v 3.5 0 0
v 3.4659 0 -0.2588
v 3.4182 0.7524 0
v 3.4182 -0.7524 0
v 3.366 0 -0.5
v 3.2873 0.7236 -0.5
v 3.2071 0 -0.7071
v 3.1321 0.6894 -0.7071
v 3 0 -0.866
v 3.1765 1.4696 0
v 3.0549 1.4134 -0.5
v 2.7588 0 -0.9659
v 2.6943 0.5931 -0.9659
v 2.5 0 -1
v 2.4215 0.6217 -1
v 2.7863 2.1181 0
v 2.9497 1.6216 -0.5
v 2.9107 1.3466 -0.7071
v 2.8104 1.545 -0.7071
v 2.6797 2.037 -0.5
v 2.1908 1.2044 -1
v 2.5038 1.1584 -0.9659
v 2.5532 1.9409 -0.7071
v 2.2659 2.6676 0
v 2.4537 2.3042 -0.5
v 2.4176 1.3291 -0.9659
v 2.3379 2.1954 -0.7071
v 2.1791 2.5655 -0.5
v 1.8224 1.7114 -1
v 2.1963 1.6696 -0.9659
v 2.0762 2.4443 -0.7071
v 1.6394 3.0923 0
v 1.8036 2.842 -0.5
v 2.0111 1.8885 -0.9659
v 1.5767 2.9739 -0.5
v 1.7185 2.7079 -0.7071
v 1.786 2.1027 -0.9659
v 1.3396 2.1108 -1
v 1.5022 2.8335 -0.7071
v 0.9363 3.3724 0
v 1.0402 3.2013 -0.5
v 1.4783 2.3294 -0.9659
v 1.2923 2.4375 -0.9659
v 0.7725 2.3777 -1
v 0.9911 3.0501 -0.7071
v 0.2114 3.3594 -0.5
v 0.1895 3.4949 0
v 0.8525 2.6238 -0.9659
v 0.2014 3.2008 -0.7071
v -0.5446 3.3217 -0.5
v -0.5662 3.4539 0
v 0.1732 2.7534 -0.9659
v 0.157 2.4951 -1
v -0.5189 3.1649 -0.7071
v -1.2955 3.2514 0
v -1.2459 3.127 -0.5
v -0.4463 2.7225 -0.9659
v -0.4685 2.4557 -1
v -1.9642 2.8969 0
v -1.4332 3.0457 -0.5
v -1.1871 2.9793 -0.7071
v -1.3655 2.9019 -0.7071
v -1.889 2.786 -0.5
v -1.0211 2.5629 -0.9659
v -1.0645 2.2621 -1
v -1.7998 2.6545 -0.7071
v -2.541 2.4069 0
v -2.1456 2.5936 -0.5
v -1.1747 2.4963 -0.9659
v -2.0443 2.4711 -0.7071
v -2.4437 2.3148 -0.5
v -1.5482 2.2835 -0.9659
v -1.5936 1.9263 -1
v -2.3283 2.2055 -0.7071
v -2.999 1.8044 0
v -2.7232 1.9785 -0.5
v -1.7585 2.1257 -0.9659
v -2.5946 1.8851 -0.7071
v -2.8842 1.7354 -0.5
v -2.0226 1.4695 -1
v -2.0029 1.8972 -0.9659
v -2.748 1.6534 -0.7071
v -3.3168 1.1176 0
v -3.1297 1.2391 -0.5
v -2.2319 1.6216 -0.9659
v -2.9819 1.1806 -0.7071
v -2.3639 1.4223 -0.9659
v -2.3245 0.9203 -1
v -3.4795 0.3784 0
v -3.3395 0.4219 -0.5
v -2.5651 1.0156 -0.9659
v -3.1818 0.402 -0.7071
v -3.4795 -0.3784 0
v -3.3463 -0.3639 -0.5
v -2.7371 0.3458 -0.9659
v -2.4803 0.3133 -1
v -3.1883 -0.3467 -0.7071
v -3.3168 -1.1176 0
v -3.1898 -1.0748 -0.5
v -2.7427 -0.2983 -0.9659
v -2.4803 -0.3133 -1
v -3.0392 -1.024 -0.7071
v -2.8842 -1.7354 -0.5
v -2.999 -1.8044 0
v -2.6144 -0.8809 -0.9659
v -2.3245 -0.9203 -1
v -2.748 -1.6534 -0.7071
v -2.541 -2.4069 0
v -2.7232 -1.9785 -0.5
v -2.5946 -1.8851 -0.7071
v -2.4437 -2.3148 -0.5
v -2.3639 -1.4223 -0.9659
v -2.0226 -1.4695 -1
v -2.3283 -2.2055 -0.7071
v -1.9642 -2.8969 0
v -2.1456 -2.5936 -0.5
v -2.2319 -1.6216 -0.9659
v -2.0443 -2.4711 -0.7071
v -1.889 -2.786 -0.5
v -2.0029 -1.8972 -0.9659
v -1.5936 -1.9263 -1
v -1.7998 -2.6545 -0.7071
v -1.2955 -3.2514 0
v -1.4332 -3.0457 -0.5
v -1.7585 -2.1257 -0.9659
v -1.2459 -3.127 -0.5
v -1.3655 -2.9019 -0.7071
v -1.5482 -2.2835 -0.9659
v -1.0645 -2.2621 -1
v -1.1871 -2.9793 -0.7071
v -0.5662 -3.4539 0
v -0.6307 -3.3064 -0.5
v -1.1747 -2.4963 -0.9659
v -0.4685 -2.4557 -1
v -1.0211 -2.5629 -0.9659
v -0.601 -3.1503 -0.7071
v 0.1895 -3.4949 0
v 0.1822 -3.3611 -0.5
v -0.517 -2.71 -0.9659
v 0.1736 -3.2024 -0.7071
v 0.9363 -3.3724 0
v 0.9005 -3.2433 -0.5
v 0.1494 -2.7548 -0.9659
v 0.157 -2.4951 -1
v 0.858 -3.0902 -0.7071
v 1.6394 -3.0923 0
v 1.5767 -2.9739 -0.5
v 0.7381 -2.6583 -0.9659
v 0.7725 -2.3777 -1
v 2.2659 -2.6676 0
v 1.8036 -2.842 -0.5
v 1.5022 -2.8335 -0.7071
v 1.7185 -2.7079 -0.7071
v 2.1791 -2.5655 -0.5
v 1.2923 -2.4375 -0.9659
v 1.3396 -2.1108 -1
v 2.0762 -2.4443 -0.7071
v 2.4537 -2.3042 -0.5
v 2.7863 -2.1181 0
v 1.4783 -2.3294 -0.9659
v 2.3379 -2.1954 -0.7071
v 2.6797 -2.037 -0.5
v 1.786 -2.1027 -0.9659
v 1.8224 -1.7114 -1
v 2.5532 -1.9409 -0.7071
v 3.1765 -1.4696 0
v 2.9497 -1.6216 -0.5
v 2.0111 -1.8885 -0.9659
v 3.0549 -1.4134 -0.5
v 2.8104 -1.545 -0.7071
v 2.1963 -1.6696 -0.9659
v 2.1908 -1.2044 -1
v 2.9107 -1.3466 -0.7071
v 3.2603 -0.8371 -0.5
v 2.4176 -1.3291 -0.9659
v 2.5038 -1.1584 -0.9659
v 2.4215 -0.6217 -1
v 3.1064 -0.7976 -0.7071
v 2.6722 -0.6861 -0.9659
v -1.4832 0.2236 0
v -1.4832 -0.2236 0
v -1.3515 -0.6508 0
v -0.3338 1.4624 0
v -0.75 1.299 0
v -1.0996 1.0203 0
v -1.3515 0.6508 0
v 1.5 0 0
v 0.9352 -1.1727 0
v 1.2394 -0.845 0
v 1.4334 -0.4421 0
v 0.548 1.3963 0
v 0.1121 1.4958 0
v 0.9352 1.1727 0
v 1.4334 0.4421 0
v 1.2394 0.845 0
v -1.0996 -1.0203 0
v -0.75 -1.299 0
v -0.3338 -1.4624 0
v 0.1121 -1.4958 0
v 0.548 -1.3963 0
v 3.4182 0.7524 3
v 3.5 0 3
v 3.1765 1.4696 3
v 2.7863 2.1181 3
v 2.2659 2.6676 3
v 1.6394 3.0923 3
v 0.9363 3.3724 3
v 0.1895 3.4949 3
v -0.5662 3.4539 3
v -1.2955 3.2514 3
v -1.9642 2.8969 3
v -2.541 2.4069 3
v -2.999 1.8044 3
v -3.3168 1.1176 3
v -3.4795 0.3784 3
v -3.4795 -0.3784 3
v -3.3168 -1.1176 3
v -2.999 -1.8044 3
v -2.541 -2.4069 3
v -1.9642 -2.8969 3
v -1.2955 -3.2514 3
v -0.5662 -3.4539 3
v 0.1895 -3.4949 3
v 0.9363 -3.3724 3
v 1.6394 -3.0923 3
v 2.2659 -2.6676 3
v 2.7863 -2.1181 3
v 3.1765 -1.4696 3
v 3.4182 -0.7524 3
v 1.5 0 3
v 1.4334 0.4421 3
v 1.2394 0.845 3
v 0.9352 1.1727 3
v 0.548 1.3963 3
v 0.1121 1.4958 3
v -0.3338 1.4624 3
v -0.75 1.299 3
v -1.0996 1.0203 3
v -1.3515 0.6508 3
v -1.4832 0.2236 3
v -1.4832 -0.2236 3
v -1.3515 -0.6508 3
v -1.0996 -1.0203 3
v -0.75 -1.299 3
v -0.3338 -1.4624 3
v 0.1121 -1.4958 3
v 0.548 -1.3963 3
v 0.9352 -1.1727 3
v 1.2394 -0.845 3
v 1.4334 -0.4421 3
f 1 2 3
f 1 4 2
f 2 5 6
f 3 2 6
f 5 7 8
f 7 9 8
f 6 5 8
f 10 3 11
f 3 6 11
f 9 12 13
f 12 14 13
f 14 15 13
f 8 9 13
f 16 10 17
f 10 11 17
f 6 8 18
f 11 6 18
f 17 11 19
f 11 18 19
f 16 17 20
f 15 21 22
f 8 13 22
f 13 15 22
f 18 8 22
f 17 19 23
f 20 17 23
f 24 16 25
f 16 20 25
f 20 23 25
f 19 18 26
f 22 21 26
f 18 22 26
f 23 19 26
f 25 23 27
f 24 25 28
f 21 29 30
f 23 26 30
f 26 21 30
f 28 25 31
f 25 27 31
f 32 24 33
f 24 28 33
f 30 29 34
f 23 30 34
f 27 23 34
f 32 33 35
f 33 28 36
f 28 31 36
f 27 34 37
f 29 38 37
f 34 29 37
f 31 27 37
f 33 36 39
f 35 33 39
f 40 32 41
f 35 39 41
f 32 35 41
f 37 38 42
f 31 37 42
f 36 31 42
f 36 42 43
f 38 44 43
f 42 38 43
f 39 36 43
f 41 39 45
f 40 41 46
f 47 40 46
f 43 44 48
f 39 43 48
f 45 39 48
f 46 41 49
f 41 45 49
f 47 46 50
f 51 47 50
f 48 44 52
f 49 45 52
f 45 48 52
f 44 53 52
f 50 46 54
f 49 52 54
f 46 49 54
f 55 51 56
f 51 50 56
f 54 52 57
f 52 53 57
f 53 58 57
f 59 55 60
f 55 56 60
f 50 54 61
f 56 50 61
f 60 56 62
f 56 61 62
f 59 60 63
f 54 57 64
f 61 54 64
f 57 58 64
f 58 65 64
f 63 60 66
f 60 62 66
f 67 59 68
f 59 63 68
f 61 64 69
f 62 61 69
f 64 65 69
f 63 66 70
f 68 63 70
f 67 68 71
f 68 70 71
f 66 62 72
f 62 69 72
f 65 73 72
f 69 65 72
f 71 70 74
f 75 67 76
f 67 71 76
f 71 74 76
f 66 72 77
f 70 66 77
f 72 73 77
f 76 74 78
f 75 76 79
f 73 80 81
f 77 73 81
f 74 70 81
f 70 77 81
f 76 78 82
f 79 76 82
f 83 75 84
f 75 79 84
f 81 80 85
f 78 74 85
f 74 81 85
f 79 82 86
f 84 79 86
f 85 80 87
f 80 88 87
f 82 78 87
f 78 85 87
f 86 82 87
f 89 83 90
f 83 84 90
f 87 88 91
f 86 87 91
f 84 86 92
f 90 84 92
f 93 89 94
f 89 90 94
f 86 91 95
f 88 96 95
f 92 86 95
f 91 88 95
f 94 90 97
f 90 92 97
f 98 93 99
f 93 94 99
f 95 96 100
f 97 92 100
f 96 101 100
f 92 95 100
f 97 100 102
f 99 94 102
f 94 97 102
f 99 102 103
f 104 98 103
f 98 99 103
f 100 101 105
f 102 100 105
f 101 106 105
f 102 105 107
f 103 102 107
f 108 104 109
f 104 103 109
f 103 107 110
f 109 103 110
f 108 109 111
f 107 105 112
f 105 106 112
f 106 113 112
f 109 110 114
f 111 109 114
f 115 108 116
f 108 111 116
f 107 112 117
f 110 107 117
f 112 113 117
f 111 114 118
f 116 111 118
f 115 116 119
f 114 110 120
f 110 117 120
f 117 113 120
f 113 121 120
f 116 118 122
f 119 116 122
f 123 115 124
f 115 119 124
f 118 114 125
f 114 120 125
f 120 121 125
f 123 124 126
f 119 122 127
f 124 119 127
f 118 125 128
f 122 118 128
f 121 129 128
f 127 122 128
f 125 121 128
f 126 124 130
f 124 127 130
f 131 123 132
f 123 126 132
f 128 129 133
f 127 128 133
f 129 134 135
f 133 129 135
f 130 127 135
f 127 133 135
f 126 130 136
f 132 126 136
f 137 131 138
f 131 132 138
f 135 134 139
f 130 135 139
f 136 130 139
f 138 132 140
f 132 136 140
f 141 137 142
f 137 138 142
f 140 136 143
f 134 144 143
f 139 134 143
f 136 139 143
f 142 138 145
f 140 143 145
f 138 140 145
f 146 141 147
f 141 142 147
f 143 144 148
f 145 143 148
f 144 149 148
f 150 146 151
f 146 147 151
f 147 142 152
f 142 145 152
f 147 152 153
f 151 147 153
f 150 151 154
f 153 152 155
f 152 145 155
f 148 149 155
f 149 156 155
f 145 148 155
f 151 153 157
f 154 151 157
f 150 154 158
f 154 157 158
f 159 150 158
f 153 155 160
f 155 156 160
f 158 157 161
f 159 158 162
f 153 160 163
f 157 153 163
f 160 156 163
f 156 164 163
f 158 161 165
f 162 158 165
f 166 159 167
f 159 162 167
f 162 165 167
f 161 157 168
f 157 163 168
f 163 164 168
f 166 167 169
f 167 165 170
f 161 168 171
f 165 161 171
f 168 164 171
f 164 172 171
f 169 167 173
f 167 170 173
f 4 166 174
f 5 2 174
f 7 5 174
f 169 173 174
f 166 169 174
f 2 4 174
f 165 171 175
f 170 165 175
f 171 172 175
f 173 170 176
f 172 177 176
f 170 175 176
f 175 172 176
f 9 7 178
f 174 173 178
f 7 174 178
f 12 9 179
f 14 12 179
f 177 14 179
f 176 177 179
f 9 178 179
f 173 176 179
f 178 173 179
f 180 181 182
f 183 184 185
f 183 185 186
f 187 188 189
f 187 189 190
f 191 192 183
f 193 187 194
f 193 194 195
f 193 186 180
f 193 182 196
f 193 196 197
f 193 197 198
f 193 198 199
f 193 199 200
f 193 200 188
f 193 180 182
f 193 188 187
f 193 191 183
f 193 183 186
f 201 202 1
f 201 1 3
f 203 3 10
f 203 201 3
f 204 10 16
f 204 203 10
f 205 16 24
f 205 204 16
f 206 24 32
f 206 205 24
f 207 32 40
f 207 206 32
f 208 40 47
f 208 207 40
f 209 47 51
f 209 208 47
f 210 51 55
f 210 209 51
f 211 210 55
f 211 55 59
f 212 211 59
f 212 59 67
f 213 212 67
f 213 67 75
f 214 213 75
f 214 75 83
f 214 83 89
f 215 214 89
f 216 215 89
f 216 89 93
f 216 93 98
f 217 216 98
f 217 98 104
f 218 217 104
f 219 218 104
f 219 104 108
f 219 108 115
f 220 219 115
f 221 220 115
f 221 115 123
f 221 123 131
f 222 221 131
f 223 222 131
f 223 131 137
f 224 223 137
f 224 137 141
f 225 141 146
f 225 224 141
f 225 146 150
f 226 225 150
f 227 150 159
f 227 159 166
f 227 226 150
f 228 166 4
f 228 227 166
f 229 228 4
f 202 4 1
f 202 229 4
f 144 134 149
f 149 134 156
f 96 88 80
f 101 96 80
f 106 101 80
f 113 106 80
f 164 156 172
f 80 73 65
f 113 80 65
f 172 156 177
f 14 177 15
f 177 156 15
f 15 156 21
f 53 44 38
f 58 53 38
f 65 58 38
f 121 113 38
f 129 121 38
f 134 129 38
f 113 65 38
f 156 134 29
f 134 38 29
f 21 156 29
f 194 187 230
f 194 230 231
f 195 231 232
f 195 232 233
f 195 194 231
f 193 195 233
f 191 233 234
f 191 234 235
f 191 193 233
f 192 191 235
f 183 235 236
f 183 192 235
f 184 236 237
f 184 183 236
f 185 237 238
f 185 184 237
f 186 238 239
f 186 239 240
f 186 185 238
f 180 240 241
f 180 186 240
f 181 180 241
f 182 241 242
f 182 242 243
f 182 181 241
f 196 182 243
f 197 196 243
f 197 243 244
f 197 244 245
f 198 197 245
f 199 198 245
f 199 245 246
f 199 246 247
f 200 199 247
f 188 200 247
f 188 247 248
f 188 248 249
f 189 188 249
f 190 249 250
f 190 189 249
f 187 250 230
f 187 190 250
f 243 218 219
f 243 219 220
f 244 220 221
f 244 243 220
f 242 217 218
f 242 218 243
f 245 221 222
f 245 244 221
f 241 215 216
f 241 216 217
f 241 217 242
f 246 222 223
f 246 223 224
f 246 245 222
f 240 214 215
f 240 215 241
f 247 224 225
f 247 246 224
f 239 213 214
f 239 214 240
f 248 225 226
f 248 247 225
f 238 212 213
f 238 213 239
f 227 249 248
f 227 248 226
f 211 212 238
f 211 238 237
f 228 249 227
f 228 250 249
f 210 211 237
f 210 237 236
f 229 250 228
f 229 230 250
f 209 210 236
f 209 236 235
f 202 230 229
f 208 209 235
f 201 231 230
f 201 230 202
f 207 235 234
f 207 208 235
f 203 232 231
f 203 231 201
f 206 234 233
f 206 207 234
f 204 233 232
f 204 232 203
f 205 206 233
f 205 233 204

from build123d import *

# Parameters (mm, degrees)
F0_R     = 3.5
F0_R_2   = 1.5
F1_DEPTH = 3
F2_R     = 3.5
F3_DEPTH = 1
F4_R     = 0.99999


# Not quite as in the source:
# - a fillet or chamfer is up to 0.001 mm smaller than in the source, because OpenCascade refuses the exact size


with BuildPart() as f1:
    # F0 (on Top) → F1 (new body)
    with BuildSketch(Plane.XY):
        Circle(F0_R)
        Circle(F0_R_2, mode=Mode.SUBTRACT)
    extrude(amount=F1_DEPTH)

    # F2 (on Top) → F3 (join)
    with BuildSketch(Plane.XY):
        Circle(F2_R)
    extrude(amount=-F3_DEPTH)

    # F4 (radius 1 in the source; OpenCascade refuses exactly that, so slightly less here)
    f4_edges = [f1.edges().sort_by_distance(p)[0] for p in [
        (-3.5, 0, -1),
    ]]
    fillet(f4_edges, radius=F4_R)


solid = f1.part
